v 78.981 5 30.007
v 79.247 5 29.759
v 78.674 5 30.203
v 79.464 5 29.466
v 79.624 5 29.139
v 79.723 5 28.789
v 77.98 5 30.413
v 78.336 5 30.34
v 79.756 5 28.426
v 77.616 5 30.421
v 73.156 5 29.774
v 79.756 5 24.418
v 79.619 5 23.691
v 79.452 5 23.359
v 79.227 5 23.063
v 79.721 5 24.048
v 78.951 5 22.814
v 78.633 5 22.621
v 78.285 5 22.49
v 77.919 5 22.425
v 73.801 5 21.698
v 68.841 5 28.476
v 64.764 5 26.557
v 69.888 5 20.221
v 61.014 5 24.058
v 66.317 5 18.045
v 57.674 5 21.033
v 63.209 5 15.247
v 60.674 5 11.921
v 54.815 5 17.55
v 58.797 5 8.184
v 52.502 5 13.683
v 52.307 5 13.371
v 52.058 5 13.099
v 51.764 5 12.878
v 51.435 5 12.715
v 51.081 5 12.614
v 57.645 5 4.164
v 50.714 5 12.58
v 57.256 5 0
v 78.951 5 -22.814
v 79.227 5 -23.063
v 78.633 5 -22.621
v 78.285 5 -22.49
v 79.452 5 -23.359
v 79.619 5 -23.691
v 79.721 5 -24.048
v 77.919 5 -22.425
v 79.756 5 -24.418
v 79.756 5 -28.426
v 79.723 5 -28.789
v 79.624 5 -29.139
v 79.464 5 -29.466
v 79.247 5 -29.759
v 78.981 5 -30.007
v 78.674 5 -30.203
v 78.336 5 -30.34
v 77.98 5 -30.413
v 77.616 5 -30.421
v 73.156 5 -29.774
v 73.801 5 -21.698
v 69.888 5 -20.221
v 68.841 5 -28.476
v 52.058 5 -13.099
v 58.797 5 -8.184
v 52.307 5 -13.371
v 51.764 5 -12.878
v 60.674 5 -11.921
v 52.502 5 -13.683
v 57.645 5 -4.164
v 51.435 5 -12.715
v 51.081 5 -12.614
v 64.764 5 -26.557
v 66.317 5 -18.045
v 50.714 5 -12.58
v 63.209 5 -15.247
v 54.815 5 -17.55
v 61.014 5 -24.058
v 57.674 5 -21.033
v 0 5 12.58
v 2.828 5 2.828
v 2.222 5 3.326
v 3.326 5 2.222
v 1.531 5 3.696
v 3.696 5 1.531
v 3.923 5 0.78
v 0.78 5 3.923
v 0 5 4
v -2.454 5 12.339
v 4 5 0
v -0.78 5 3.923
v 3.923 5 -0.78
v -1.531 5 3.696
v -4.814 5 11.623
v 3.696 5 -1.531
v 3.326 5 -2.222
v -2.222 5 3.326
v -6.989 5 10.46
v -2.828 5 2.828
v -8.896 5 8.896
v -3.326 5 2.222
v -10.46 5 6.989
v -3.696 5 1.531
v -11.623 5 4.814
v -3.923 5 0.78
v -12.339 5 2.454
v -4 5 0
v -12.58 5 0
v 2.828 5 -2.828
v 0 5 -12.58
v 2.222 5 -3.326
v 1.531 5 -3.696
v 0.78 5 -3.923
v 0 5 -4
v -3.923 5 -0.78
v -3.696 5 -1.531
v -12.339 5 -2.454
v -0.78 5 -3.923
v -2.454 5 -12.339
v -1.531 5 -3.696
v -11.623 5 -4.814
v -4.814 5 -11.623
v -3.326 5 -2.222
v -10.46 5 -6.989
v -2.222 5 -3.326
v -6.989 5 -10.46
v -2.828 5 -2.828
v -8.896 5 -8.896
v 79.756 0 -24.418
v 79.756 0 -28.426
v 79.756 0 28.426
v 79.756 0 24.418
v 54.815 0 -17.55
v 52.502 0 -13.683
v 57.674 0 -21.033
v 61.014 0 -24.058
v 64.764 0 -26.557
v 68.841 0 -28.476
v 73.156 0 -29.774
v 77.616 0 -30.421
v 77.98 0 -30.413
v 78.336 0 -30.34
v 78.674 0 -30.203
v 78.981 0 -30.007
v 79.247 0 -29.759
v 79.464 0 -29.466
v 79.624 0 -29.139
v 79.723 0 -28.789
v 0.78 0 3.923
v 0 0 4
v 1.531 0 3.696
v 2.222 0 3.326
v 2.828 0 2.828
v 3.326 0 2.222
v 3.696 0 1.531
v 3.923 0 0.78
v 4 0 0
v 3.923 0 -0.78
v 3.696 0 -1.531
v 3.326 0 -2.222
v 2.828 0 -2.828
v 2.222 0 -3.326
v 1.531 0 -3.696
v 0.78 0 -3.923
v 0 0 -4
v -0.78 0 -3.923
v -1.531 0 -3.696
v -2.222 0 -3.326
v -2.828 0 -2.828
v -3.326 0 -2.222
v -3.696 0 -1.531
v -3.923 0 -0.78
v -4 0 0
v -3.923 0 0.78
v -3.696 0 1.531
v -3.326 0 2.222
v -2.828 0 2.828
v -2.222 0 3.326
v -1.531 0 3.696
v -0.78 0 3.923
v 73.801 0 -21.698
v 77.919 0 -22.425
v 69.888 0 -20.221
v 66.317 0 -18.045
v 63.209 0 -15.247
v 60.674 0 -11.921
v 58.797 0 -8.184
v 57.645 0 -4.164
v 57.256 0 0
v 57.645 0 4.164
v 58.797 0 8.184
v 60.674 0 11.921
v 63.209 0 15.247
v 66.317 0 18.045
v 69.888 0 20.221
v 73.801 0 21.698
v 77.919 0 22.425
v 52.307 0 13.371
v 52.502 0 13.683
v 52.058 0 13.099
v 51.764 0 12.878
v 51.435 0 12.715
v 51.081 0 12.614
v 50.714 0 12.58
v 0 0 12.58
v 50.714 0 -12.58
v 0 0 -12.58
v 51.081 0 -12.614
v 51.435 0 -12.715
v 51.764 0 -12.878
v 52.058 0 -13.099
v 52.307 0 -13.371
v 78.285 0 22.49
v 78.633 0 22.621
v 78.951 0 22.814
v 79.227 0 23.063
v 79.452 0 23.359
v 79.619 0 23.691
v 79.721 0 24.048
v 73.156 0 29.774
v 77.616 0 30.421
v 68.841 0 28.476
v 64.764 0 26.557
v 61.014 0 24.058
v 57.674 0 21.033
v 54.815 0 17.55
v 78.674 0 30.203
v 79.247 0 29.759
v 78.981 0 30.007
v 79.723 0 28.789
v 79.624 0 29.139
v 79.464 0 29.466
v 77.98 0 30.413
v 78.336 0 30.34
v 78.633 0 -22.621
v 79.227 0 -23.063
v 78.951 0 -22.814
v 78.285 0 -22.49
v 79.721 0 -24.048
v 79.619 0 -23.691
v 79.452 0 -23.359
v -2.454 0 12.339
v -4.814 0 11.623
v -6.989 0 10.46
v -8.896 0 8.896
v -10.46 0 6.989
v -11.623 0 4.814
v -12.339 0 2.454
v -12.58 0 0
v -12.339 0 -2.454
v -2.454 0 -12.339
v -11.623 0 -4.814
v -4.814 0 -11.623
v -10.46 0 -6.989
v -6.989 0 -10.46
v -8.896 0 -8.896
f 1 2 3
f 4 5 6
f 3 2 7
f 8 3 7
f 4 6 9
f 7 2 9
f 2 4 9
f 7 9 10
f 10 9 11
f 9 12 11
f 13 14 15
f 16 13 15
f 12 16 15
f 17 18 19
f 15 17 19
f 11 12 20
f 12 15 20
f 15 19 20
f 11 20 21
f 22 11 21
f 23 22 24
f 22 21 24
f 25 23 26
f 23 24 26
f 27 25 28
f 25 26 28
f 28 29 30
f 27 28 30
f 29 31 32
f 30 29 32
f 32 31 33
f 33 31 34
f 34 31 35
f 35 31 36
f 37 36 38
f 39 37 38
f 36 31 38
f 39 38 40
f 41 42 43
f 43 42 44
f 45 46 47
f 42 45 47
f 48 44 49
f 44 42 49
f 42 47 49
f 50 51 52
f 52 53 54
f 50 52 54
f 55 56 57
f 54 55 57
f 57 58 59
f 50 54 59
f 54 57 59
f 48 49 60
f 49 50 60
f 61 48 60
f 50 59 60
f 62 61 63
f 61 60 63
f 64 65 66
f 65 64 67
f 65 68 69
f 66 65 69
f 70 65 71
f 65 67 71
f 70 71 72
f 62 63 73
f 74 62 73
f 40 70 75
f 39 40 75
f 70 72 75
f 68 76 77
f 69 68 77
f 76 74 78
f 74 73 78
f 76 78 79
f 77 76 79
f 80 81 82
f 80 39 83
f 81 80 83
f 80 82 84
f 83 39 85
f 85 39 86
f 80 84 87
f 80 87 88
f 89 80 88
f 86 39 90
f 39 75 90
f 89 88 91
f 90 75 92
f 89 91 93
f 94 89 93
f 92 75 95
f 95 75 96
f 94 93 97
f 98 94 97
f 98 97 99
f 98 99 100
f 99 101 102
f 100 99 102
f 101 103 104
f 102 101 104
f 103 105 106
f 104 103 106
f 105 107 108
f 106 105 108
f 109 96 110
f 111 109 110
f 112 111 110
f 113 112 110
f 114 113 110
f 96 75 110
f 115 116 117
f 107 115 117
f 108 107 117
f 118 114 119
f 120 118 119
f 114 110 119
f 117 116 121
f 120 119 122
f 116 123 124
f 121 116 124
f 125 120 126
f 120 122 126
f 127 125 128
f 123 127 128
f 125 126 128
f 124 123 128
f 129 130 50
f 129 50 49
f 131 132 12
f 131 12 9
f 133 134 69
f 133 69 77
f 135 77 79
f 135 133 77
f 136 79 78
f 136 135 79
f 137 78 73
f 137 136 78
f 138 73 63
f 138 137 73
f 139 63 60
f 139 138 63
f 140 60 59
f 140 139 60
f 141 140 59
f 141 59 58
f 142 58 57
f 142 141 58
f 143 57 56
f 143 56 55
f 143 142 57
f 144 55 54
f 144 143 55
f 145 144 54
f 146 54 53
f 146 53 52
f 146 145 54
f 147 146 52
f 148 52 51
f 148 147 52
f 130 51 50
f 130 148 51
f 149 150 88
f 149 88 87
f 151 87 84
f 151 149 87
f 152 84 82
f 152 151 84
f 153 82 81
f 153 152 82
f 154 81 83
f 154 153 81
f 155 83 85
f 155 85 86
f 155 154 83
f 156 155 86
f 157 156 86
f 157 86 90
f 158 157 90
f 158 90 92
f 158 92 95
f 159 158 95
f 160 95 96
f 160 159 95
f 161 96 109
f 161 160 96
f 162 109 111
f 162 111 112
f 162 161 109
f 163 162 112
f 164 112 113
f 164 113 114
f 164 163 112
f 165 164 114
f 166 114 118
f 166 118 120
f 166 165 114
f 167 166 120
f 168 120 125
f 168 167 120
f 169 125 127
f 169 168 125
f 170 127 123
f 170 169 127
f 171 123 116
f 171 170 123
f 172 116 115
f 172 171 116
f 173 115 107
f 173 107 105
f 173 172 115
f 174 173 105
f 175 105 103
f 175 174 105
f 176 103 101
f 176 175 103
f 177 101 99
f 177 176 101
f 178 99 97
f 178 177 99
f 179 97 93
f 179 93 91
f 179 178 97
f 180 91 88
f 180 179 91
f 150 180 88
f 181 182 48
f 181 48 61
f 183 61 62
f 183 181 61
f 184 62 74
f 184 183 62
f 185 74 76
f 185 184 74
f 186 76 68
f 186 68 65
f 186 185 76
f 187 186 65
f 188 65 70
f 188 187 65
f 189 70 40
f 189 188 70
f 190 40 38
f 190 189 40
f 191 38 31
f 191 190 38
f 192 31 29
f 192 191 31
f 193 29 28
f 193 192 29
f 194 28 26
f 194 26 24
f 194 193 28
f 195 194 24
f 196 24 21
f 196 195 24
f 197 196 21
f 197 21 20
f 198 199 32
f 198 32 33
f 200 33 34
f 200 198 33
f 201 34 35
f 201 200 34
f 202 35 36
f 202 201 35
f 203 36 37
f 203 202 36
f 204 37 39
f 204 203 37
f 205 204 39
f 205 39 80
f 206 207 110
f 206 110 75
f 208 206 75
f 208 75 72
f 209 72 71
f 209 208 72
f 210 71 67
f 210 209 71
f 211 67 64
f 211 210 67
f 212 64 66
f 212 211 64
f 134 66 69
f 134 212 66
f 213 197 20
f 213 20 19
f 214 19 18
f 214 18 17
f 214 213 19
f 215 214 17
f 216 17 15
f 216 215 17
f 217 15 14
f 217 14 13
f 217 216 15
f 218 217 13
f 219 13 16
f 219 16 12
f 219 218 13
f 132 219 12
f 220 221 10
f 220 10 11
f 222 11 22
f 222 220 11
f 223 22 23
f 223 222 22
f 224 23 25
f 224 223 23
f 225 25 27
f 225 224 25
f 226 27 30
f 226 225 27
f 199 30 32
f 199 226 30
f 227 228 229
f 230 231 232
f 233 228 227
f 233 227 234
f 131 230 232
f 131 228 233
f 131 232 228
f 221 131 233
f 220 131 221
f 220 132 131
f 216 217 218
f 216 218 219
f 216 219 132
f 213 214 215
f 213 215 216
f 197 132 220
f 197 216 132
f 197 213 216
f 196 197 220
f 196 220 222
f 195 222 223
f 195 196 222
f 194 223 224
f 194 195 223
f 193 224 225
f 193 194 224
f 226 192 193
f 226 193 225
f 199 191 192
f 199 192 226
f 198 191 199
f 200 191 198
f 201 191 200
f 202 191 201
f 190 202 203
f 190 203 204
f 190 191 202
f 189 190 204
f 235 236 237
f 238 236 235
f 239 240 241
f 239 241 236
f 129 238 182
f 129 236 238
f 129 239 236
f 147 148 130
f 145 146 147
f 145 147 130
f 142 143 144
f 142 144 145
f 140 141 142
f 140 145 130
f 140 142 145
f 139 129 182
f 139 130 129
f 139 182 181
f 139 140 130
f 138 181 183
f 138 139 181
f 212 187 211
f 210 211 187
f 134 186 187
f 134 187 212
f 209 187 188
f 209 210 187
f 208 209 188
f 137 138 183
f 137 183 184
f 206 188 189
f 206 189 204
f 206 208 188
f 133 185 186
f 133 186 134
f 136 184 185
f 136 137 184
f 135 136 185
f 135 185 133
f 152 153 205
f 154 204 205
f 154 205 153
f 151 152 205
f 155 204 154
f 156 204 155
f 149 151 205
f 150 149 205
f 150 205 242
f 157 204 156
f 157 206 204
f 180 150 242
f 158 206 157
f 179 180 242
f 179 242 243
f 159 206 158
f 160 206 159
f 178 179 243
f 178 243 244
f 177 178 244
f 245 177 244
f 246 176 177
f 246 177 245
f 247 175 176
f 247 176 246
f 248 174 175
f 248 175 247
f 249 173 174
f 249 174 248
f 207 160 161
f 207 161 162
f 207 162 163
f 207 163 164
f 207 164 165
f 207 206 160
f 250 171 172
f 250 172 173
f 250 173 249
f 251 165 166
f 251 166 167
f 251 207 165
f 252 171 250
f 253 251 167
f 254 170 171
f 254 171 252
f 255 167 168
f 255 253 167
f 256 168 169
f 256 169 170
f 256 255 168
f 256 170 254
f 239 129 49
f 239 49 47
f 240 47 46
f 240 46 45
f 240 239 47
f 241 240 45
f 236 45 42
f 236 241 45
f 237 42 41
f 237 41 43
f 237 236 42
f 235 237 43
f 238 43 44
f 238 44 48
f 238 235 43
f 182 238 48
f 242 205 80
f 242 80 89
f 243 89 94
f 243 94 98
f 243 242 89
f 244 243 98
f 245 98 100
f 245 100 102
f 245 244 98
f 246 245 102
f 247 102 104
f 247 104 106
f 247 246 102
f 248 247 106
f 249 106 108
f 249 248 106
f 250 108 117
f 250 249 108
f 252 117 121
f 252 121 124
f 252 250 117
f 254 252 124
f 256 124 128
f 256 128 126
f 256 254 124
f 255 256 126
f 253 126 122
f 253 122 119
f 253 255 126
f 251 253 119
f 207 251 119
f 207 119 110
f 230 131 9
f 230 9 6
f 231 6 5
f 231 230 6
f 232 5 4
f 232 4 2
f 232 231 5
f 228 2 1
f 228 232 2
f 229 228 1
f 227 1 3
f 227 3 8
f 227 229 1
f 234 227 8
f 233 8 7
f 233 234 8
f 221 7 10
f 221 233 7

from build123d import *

# Parameters (mm, degrees)
SKETCH1_R           = 4
BOSS_EXTRUDE1_DEPTH = 5


with BuildPart() as part:
    # Sketch1 → Boss-Extrude1 (new body)
    with BuildSketch(Plane(origin=(0, 0, 0), x_dir=(1, 0, 0), z_dir=(0, 1, 0))):
        with BuildLine():
            Line((0, 12.580465515), (50.714293016, 12.580465515))
            ThreePointArc((50.714293016, 12.580465515), (51.764359173, 12.878301873), (52.501677451, 13.68310445))
            ThreePointArc((52.501677451, 13.68310445), (62.84292145, 25.376627415), (77.615630991, 30.421115454))
            ThreePointArc((77.615630991, 30.421115454), (79.119682878, 29.889047403), (79.756, 28.4260474))
            Line((79.756, 28.4260474), (79.756, 24.418230894))
            ThreePointArc((79.756, 24.418230894), (79.226804306, 23.06296904), (77.919265306, 22.424905923))
            ThreePointArc((77.919265306, 22.424905923), (57.256, 0), (77.919265306, -22.424905923))
            ThreePointArc((77.919265306, -22.424905923), (79.226804306, -23.06296904), (79.756, -24.418230894))
            Line((79.756, -24.418230894), (79.756, -28.4260474))
            ThreePointArc((79.756, -28.4260474), (79.119682878, -29.889047403), (77.615630991, -30.421115454))
            ThreePointArc((77.615630991, -30.421115454), (62.84292145, -25.376627415), (52.501677451, -13.68310445))
            ThreePointArc((52.501677451, -13.68310445), (51.764359173, -12.878301873), (50.714293016, -12.580465515))
            Line((50.714293016, -12.580465515), (0, -12.580465515))
            ThreePointArc((0, -12.580465515), (-12.580465515, 0), (0, 12.580465515))
        make_face()
        with Locations(Location((0, 0, 0), (0, 0, 270))):
            Circle(SKETCH1_R, mode=Mode.SUBTRACT)
    extrude(amount=BOSS_EXTRUDE1_DEPTH)


solid = part.part
